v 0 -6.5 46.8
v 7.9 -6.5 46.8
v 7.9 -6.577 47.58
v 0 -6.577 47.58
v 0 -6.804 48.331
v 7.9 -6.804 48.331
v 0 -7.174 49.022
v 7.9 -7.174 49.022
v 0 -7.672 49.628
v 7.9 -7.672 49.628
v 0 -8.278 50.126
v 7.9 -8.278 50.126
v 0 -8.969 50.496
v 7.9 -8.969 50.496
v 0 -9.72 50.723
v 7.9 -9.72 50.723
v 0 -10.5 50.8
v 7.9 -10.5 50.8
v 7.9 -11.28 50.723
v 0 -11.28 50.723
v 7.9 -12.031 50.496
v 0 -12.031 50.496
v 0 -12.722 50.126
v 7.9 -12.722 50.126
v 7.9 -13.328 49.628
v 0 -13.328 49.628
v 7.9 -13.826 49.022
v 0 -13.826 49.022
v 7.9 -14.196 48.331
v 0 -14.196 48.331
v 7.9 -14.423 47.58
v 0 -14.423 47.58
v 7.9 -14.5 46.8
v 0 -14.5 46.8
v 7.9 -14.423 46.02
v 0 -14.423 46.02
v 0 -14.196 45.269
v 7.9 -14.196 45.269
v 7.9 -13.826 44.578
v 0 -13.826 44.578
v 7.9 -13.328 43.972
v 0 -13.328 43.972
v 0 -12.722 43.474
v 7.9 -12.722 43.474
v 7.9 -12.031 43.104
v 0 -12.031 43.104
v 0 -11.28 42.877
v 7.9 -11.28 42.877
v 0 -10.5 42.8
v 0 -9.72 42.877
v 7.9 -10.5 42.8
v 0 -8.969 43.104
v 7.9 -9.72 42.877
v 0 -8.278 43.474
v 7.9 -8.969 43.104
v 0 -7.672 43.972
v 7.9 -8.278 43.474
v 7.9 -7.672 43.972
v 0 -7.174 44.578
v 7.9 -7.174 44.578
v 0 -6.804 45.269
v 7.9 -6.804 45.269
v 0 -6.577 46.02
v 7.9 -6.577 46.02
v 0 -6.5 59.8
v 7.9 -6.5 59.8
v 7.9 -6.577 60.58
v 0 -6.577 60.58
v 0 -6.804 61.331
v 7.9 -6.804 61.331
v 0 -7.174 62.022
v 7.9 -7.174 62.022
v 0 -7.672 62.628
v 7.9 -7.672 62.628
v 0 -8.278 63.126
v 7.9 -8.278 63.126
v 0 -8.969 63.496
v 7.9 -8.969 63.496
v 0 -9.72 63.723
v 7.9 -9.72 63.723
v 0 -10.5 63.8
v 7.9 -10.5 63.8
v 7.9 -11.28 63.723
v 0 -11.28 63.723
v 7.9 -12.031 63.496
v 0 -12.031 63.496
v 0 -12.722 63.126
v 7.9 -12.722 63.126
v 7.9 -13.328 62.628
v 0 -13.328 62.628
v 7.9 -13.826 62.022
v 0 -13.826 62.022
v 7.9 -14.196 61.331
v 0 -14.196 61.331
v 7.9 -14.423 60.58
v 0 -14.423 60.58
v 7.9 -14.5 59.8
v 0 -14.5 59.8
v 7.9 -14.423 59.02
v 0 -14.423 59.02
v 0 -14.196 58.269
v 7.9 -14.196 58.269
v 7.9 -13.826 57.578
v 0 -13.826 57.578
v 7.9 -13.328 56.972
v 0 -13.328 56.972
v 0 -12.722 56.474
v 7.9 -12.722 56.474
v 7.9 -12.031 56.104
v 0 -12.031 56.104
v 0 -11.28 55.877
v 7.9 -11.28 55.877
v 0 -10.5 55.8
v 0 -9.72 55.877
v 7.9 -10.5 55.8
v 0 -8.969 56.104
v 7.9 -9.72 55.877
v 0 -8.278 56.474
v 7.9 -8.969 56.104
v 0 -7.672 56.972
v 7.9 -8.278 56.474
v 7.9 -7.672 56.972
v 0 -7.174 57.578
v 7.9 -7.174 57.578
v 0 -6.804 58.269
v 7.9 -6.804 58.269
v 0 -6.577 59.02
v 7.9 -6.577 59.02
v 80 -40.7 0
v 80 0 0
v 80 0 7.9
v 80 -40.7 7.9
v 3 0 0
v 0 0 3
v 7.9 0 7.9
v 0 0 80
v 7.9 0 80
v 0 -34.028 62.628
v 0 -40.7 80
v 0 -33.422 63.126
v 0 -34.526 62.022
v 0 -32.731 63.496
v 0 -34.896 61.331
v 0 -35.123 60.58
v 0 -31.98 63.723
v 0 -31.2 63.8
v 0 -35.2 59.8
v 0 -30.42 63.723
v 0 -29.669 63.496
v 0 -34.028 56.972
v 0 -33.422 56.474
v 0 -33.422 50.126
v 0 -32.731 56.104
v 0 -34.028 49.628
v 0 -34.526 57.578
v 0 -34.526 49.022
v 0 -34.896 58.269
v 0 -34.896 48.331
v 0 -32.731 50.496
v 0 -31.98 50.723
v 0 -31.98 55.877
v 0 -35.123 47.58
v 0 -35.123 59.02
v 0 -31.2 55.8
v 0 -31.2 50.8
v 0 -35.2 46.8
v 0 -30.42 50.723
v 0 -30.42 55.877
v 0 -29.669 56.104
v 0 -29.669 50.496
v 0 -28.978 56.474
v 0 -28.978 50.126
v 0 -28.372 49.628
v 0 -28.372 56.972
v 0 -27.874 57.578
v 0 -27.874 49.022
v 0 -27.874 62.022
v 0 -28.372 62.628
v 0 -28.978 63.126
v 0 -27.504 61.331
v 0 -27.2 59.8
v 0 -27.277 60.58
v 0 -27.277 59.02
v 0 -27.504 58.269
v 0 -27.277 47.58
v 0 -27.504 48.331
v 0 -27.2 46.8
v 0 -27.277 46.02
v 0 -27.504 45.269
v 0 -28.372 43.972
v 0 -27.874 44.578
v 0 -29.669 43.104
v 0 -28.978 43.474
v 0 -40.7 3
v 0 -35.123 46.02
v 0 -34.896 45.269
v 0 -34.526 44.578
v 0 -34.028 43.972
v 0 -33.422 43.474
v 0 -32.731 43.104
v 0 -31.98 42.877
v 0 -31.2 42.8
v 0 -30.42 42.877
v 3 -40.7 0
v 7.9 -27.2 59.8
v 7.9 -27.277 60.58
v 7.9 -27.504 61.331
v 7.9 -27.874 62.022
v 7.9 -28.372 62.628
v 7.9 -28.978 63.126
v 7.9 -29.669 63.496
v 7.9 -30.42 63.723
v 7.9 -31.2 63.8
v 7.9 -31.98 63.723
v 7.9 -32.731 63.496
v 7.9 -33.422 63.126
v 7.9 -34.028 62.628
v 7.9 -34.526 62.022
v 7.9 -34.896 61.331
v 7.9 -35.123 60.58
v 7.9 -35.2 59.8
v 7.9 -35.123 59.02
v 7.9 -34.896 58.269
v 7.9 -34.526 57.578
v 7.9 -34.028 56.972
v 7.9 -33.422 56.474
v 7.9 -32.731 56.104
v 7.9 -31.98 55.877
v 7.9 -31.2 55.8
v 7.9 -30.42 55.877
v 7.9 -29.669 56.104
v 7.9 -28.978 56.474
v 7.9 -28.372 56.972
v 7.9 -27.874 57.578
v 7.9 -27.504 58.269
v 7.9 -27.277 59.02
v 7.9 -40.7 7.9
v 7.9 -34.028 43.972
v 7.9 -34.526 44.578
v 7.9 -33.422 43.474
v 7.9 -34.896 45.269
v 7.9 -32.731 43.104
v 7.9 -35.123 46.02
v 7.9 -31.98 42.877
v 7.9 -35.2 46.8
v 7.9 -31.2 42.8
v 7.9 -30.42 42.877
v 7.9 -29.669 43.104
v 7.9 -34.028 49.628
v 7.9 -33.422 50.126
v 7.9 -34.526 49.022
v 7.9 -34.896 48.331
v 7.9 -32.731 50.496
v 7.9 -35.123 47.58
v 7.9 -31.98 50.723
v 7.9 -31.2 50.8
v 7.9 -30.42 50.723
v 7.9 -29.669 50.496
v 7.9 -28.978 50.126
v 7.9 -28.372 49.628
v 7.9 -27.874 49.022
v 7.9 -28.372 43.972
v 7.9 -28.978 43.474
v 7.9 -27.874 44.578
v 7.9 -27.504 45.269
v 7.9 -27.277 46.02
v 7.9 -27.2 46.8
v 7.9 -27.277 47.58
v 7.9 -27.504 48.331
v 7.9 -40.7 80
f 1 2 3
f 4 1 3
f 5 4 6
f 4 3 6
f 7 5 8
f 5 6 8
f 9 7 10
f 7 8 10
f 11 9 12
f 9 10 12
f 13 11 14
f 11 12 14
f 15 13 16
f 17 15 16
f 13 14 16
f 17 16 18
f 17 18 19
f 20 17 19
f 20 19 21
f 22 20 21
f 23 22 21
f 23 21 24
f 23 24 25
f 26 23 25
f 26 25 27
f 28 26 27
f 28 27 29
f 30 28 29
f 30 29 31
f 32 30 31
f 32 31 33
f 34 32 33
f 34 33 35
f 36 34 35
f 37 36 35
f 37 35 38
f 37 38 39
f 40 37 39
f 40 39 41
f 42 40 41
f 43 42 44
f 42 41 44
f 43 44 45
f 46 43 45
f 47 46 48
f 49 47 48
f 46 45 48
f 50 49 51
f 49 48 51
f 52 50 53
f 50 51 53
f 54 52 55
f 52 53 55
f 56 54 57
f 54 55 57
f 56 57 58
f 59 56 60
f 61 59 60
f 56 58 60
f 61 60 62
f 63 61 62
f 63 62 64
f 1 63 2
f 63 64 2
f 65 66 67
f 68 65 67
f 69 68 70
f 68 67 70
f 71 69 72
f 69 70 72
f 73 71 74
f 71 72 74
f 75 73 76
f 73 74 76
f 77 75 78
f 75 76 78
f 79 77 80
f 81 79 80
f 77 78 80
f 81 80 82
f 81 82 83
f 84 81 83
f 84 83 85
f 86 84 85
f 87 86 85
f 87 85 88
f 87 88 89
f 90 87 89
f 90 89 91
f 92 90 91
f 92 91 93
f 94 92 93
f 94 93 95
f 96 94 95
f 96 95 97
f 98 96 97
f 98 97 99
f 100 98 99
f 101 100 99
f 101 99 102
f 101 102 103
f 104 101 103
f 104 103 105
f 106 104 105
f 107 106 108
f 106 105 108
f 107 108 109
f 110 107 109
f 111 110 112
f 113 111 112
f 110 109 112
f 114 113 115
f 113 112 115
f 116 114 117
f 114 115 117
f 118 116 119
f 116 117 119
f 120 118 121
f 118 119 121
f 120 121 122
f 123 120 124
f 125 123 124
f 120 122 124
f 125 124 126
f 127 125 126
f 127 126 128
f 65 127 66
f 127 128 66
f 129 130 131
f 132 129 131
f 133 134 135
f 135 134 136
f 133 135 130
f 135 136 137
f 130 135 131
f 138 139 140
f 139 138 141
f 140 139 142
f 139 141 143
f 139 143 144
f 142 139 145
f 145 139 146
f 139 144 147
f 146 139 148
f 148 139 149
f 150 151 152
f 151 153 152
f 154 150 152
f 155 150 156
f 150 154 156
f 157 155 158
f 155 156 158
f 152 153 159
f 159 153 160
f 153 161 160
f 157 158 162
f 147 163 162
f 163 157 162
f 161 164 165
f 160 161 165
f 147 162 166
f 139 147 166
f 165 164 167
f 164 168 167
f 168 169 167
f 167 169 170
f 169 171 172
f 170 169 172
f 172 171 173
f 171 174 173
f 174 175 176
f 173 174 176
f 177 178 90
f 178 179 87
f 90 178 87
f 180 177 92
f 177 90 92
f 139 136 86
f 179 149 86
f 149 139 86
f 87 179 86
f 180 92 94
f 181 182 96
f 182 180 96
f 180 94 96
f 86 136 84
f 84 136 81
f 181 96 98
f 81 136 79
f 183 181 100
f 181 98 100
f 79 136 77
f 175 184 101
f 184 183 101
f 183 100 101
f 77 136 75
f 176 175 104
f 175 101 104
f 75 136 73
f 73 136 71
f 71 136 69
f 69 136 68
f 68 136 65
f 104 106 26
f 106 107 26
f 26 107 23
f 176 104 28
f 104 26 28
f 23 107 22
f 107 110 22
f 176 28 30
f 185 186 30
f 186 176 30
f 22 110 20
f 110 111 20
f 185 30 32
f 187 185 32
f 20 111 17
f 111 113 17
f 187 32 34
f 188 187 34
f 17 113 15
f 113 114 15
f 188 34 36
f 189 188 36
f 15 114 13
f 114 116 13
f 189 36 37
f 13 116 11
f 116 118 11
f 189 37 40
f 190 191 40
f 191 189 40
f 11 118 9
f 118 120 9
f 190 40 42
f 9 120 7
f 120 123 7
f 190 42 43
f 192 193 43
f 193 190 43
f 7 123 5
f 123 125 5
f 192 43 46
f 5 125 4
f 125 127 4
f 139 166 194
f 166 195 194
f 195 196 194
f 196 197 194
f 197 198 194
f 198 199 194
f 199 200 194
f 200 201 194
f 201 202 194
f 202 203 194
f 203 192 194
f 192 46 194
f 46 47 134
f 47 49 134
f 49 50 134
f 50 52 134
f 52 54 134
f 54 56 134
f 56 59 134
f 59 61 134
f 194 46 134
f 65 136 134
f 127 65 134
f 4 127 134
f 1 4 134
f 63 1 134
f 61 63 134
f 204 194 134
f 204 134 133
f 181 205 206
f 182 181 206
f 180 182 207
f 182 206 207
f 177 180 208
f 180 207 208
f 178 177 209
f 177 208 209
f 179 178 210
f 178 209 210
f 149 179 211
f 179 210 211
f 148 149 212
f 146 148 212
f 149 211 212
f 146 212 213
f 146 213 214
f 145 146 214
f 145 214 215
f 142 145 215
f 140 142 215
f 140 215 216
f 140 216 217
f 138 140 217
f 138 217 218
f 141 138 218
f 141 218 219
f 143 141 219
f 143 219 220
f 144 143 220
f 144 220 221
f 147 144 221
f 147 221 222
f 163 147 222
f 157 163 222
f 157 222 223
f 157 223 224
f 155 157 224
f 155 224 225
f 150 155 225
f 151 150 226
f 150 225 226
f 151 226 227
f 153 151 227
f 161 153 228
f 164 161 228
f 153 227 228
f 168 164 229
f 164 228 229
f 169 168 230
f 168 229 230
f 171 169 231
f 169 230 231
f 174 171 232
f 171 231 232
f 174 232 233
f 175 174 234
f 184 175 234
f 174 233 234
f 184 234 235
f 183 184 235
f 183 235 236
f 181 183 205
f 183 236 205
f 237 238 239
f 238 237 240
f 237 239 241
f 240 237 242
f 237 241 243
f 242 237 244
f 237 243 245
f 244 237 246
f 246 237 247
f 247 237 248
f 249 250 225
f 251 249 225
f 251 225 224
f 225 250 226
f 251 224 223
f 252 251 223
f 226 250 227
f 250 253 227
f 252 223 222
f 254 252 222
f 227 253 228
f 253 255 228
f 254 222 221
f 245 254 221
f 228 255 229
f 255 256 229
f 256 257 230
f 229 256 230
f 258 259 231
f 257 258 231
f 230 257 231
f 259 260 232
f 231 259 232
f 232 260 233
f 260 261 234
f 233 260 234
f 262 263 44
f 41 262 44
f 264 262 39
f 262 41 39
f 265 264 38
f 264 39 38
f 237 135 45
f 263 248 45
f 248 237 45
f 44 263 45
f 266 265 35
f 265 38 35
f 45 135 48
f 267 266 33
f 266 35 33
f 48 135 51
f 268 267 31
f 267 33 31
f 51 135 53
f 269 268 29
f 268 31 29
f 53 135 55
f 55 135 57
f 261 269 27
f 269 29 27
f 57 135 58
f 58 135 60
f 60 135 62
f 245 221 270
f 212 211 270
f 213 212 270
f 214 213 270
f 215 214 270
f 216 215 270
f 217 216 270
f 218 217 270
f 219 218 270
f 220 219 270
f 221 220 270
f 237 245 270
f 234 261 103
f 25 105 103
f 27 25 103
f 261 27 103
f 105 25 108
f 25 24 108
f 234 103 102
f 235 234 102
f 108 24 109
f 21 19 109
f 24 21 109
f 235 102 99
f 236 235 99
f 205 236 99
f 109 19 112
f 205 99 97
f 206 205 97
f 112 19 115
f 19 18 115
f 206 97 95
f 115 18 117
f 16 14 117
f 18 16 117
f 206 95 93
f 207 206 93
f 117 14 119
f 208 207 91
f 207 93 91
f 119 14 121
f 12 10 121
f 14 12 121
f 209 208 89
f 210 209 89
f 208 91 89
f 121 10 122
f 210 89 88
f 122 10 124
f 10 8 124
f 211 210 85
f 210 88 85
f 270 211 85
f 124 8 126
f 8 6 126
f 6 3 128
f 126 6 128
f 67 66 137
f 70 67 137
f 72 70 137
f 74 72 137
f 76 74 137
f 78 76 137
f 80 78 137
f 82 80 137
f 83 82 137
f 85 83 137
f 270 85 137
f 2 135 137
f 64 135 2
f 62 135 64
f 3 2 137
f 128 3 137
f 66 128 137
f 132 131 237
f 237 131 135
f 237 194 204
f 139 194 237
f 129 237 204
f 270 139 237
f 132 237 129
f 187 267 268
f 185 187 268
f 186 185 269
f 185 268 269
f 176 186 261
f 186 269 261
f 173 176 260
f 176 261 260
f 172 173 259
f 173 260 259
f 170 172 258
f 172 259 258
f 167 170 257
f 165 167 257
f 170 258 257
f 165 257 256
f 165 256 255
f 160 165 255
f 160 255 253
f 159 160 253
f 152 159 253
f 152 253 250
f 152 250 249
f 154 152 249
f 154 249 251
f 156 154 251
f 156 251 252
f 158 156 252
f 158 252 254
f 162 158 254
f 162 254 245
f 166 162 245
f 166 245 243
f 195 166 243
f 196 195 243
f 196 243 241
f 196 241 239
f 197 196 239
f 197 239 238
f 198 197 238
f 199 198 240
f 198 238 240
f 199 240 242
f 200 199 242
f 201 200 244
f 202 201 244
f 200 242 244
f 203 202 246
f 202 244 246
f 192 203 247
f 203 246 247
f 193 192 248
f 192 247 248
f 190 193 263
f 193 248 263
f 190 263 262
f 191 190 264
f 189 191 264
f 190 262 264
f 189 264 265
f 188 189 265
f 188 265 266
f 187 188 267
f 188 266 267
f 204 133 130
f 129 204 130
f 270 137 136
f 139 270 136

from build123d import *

# Parameters (mm, degrees)
F1_DEPTH = 40.7
F2_R     = 4
F3_DEPTH = 25


with BuildPart() as f1:
    # F0 (on Front) → F1 (new body)
    with BuildSketch(Plane.XZ):
        Polygon((7.9, 80), (0, 80), (0, 3), (3, 0), (80, 0), (80, 7.9), (7.9, 7.9), align=None)
    extrude(amount=F1_DEPTH)

    # F2 (on face) → F3 (cut)
    with BuildSketch(Plane.YZ.offset(7.9)):
        with Locations((-31.2, 59.8)):
            Circle(F2_R)
        with Locations((-31.2, 46.8)):
            Circle(F2_R)
        with Locations((-10.5, 46.8)):
            Circle(F2_R)
        with Locations((-10.5, 59.8)):
            Circle(F2_R)
    extrude(amount=-F3_DEPTH, mode=Mode.SUBTRACT)


solid = f1.part
